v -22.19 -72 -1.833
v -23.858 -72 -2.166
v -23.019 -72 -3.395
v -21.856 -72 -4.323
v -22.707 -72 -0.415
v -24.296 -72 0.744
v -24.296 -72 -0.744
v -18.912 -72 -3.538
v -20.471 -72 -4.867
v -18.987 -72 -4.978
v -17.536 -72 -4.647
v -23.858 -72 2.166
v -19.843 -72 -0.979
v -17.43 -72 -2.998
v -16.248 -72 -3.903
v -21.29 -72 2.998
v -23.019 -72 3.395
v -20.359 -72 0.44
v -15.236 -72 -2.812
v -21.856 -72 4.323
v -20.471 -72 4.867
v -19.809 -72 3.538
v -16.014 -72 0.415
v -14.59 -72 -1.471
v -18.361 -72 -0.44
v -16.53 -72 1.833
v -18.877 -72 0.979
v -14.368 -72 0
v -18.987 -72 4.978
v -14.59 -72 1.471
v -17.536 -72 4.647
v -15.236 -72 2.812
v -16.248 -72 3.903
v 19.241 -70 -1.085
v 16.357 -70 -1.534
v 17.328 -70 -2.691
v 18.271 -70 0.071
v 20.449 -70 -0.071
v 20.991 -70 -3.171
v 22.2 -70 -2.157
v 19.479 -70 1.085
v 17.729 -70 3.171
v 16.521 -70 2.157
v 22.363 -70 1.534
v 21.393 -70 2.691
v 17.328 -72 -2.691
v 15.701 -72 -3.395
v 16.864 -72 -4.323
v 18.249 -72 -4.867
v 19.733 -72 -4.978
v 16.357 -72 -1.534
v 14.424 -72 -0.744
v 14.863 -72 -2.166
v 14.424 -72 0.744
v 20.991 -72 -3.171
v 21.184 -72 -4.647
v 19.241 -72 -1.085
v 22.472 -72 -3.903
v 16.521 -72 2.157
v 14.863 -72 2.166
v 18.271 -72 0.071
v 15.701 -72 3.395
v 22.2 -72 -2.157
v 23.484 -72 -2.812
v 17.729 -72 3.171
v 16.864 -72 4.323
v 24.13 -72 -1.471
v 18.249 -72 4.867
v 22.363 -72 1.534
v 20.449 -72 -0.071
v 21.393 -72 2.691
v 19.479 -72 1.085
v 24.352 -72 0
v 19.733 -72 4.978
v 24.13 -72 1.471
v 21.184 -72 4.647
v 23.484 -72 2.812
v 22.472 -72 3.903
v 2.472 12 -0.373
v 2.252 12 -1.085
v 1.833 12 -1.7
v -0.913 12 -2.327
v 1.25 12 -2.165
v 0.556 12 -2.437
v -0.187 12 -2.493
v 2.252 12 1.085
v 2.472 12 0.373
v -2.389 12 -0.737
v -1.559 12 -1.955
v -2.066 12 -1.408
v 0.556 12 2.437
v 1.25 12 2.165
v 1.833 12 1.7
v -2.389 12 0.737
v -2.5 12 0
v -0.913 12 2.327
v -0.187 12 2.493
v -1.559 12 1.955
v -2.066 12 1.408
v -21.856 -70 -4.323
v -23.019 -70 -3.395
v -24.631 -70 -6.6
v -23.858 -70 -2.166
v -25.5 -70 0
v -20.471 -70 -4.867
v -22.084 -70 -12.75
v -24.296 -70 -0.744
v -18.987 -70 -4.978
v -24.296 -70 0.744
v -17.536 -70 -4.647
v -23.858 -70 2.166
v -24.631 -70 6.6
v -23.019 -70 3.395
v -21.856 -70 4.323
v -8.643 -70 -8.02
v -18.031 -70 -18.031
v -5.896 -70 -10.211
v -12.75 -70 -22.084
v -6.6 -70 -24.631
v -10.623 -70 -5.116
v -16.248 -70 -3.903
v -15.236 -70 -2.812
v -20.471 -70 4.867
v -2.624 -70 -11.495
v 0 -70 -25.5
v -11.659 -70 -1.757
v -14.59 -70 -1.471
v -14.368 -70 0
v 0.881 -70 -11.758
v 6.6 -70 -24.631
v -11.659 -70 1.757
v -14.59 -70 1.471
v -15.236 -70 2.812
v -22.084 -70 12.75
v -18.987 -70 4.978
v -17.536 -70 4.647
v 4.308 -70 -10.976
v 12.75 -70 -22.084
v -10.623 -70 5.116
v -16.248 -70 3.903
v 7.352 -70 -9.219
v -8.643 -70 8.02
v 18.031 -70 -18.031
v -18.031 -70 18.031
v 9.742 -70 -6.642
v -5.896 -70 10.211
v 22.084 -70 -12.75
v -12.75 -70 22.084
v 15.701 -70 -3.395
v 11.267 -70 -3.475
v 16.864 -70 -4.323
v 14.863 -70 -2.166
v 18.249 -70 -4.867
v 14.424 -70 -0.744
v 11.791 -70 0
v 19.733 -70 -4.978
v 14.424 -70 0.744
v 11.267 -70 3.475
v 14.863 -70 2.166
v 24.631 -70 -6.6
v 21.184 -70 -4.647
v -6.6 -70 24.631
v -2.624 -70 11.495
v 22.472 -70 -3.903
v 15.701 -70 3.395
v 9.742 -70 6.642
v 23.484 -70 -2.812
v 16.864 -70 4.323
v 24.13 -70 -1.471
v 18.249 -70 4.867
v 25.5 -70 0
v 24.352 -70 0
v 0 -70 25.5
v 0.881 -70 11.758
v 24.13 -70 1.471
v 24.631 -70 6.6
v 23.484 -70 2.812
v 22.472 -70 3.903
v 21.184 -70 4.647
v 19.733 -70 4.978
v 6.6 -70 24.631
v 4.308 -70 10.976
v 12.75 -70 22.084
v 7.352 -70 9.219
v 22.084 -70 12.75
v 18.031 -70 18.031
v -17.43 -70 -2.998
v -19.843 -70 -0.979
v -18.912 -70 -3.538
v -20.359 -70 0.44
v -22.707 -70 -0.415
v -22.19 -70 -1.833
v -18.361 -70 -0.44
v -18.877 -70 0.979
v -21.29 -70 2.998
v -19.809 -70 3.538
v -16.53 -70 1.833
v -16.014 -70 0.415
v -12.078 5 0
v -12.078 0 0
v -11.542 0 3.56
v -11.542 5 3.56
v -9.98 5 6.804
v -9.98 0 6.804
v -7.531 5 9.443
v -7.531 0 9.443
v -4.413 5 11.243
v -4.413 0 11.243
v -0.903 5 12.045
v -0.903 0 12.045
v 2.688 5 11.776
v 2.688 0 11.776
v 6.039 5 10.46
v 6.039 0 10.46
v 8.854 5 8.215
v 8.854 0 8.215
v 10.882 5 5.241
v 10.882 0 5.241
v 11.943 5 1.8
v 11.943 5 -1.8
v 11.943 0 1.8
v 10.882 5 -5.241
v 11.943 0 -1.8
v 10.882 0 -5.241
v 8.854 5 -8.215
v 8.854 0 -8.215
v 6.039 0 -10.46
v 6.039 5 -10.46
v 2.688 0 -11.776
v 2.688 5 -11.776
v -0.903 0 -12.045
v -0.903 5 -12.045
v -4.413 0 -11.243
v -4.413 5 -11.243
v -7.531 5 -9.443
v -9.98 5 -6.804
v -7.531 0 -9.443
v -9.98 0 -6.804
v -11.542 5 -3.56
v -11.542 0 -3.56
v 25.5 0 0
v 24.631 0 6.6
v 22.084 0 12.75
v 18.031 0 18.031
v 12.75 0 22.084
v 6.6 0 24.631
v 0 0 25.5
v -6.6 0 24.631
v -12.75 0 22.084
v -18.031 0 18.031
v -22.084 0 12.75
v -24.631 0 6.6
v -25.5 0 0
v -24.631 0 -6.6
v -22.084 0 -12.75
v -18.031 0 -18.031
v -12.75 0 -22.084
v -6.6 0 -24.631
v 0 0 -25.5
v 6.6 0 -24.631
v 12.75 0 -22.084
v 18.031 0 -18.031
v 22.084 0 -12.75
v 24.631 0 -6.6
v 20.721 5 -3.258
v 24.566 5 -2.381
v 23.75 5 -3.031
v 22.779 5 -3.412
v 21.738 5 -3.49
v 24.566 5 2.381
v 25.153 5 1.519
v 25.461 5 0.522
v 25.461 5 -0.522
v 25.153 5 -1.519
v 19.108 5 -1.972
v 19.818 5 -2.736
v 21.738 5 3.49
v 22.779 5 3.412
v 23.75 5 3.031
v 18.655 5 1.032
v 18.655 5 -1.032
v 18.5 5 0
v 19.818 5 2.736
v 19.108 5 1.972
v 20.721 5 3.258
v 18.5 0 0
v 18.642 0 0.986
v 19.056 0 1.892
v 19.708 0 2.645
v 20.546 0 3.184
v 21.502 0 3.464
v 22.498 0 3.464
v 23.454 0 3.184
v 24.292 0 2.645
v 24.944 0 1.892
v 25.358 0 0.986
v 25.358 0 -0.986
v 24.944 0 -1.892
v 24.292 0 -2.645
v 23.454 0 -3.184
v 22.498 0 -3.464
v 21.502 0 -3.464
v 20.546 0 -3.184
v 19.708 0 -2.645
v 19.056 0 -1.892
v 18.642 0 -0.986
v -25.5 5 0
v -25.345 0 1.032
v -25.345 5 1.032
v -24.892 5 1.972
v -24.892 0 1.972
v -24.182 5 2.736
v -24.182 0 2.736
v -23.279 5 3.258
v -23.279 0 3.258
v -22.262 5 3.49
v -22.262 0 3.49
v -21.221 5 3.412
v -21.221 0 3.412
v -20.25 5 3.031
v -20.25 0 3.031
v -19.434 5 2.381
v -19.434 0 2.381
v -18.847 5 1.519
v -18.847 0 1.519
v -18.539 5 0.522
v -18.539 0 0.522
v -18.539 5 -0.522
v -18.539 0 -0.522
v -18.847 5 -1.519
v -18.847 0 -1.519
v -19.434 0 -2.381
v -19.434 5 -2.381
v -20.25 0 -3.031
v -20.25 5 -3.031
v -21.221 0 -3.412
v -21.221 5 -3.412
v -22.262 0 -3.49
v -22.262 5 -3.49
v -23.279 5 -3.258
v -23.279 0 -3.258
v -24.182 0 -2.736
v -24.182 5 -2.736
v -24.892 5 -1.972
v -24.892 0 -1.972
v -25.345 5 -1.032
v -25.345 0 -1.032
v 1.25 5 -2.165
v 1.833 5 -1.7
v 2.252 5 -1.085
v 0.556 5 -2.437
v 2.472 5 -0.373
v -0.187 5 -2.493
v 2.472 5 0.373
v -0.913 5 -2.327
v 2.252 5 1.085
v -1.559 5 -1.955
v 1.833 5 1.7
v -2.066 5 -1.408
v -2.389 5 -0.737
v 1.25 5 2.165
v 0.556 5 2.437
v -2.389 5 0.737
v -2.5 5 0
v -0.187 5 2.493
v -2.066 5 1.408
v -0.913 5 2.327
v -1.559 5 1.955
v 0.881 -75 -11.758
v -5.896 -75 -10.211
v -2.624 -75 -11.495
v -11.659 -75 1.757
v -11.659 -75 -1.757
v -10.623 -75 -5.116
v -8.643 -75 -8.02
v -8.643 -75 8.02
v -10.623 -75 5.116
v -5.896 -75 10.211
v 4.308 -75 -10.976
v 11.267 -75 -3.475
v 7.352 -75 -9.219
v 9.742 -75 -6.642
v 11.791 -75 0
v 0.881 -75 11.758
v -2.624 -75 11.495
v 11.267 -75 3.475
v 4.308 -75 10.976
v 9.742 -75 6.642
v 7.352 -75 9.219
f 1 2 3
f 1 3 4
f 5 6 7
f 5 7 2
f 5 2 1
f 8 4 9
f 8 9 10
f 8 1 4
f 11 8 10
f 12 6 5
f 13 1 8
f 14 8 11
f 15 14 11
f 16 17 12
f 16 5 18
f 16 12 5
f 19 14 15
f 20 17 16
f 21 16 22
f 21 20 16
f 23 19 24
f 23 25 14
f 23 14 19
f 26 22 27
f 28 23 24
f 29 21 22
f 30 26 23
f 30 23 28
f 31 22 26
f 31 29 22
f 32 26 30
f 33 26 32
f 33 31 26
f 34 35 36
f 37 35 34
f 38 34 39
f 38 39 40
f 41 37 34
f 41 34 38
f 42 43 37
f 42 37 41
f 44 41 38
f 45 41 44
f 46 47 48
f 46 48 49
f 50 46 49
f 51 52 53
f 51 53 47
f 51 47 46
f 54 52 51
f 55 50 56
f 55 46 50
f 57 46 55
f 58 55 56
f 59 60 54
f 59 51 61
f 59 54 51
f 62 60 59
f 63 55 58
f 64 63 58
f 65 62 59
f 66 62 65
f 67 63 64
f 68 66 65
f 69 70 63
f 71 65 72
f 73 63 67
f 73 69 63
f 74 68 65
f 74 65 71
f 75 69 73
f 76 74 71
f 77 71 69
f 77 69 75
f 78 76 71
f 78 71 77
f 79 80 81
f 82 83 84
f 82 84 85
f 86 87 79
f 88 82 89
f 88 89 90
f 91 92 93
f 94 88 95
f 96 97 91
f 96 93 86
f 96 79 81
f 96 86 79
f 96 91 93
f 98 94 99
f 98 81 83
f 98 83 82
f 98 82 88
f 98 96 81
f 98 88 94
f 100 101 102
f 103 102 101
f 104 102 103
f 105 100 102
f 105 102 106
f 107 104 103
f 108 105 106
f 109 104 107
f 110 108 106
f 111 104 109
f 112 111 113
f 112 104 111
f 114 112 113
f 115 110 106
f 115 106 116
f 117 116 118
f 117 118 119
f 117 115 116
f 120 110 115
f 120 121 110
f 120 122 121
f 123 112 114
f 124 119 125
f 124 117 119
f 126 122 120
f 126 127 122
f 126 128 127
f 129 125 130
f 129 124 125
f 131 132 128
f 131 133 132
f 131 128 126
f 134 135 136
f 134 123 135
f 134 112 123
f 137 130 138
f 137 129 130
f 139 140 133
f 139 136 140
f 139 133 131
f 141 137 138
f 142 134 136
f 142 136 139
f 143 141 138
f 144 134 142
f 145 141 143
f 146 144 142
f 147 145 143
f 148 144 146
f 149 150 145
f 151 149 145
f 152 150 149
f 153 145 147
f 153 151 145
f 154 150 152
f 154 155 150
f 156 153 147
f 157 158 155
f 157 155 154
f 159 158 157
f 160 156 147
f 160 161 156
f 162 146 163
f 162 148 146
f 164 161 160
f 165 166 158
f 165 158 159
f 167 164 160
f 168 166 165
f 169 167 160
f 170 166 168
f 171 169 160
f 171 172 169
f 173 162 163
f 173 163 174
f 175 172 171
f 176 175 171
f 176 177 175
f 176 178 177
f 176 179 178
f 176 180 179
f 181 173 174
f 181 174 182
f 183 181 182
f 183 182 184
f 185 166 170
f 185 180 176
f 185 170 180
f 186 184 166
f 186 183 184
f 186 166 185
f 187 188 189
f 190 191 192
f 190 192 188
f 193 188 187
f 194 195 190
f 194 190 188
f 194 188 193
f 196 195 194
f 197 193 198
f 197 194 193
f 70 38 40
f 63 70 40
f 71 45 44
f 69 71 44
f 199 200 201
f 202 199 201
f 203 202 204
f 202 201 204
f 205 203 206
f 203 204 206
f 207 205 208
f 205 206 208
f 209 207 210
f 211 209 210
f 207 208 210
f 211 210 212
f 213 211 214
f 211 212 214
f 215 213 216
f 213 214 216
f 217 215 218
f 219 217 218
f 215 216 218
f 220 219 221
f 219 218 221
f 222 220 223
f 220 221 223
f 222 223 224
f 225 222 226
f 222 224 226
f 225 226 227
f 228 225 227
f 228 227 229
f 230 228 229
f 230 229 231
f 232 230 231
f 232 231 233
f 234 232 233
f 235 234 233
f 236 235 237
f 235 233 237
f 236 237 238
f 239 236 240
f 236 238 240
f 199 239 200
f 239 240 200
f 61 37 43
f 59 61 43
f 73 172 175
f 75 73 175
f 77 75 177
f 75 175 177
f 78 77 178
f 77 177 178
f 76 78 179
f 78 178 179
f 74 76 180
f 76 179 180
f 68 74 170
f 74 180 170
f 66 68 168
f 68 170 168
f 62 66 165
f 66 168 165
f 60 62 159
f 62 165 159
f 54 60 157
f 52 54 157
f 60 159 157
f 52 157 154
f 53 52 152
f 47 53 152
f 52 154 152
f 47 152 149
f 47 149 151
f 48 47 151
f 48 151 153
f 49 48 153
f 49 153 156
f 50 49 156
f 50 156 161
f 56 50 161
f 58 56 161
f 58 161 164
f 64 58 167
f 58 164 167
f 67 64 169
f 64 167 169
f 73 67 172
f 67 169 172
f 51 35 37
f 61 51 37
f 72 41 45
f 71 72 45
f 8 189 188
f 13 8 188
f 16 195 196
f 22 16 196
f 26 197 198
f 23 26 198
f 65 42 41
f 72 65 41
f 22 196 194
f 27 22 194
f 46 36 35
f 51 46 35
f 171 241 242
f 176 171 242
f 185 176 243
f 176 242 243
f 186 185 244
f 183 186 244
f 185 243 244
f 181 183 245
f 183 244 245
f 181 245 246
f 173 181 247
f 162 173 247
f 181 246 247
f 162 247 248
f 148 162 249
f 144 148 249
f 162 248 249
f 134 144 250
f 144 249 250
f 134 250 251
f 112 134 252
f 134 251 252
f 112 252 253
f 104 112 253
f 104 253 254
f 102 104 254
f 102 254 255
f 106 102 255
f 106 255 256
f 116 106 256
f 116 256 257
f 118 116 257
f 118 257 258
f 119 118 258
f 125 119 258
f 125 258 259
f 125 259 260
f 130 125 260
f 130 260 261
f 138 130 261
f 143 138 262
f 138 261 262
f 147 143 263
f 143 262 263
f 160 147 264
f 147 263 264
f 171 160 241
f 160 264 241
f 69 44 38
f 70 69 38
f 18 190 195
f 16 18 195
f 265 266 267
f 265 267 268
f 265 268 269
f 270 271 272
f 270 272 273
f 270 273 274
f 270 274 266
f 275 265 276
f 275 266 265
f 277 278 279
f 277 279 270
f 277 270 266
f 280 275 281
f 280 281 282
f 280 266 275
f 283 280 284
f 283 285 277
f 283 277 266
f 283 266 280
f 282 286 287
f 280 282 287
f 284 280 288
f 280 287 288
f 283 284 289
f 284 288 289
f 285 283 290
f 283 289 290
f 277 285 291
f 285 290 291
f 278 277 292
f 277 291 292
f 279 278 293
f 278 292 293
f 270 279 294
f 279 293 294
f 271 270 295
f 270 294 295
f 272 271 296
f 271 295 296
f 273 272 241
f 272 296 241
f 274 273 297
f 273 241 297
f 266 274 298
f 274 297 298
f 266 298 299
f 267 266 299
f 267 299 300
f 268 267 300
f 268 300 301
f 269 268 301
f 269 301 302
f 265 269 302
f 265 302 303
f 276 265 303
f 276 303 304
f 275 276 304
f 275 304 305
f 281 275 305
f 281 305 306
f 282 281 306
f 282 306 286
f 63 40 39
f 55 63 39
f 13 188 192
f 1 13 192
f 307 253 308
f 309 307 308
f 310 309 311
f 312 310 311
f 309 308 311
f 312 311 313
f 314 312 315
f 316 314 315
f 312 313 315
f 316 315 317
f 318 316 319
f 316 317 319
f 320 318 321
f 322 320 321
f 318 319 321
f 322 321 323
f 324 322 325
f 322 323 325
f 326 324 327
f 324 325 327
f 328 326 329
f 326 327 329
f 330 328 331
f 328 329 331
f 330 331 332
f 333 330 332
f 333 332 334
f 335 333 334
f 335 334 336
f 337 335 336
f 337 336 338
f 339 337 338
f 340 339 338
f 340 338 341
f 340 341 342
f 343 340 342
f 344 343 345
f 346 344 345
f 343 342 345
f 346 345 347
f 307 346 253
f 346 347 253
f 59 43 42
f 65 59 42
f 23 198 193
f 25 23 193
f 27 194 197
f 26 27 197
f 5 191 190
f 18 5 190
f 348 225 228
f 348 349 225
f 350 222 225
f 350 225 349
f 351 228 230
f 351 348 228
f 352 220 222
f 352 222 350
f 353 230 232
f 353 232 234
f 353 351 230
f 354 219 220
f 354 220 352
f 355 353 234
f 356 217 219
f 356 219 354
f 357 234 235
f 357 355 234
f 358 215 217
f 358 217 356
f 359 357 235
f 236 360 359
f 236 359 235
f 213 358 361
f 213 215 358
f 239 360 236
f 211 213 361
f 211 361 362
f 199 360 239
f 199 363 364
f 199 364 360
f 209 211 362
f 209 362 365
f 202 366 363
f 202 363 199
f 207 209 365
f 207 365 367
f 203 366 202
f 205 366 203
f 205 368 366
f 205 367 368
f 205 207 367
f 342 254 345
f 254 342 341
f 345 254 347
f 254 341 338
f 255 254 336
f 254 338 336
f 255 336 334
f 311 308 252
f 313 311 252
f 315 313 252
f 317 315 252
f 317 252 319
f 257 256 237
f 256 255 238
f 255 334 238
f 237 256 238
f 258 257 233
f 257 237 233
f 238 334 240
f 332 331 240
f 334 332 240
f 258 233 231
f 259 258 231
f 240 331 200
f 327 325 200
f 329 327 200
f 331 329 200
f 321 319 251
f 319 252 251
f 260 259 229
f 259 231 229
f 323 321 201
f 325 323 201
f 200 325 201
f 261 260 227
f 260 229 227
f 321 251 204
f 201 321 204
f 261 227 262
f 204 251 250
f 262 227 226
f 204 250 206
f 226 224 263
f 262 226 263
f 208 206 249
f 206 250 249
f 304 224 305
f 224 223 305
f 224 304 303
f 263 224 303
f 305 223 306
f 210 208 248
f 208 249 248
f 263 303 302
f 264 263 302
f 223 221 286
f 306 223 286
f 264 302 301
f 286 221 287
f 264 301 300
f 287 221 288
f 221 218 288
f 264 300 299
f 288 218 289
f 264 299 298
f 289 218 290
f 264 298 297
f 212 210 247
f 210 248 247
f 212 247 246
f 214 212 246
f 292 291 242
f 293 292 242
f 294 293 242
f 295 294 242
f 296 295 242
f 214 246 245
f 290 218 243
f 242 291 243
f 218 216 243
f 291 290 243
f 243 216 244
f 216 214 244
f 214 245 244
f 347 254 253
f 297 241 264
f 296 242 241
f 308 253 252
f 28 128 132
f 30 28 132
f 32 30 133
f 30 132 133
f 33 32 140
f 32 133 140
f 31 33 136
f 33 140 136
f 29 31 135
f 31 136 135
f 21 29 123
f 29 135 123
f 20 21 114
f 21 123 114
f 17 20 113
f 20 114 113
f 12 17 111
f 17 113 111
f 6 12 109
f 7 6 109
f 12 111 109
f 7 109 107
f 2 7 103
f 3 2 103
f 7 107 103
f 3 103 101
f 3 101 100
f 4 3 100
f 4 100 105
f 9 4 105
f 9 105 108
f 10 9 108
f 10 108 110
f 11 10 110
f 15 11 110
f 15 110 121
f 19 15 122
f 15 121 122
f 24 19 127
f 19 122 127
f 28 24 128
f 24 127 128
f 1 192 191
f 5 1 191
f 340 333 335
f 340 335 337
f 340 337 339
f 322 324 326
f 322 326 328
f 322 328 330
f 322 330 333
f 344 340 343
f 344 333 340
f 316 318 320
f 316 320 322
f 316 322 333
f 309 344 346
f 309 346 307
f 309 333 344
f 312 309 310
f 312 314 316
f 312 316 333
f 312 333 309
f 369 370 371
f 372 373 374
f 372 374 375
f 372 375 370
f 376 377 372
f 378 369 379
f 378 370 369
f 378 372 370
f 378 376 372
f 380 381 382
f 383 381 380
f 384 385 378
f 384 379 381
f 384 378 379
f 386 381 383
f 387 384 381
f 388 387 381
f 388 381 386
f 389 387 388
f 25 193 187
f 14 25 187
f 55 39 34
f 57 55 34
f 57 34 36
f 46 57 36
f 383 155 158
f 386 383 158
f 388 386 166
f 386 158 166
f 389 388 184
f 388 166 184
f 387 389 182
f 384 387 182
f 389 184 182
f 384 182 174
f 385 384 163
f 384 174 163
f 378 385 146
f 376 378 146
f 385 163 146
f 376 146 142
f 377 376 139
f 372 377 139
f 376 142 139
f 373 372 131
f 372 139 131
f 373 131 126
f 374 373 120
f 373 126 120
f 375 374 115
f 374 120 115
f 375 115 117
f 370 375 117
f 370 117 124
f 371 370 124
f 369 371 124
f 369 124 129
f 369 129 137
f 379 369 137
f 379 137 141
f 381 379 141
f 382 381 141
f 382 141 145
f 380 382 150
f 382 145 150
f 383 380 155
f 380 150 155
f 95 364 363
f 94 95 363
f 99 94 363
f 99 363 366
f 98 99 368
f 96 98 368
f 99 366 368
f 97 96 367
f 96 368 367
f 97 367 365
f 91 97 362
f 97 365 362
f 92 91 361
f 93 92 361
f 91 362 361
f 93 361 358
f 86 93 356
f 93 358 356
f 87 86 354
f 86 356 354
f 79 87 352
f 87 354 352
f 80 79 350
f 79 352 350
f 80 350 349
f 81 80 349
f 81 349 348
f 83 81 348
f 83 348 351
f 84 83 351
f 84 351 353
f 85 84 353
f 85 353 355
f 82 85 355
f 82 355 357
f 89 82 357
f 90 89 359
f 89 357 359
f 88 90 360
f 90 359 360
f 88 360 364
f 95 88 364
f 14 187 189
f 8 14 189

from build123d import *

# Parameters (mm, degrees)
F0_R     = 25.5
F1_DEPTH = 70
F2_R     = 11.791029
F3_DEPTH = 5
F4_R     = 12.078347
F4_R_2   = 3.5
F5_DEPTH = 5
F6_R     = 2.5
F7_DEPTH = 7
F8_R     = 4.991822
F9_DEPTH = 2


with BuildPart() as f1:
    # F0 (on Front) → F1 (new body)
    with BuildSketch(Plane.XZ):
        Circle(F0_R)
    extrude(amount=F1_DEPTH)

    # F2 (on face) → F3 (join)
    with BuildSketch(Plane.XZ.offset(70)):
        Circle(F2_R)
    extrude(amount=F3_DEPTH)

    # F4 (on face) → F5 (join)
    with BuildSketch(Plane(origin=(0, 0, 0), x_dir=(-1, 0, 0), z_dir=(0, 1, 0))):
        Circle(F4_R)
        with Locations((-22, 0)):
            Circle(F4_R_2)
        with Locations((22, 0)):
            Circle(F4_R_2)
    extrude(amount=F5_DEPTH)

    # F6 (on face) → F7 (join)
    with BuildSketch(Plane(origin=(0, 5, 0), x_dir=(-1, 0, 0), z_dir=(0, 1, 0))):
        Circle(F6_R)
    extrude(amount=F7_DEPTH)

    # F8 (on face) → F9 (join)
    with BuildSketch(Plane.XZ.offset(70)):
        with Locations((-19.360058, 0)):
            Circle(F8_R)
        Polygon((-20.359145, 0.43953), (-21.290478, 2.998349), (-19.808572, 3.537719), (-18.877238, 0.9789), (-16.529848, 1.83328), (-16.013582, 0.41485), (-18.360971, -0.43953), (-17.429638, -2.998349), (-18.911544, -3.537719), (-19.842878, -0.9789), (-22.190268, -1.83328), (-22.706534, -0.41485), align=None, mode=Mode.SUBTRACT)
        with Locations((19.360058, 0)):
            Circle(F8_R)
        Polygon((19.241159, -1.085), (17.327549, -2.690709), (16.357286, -1.534394), (18.270895, 0.071316), (16.52056, 2.157284), (17.728622, 3.170968), (19.478957, 1.085), (21.392567, 2.690709), (22.36283, 1.534394), (20.449221, -0.071316), (22.199556, -2.157284), (20.991494, -3.170968), align=None, mode=Mode.SUBTRACT)
    extrude(amount=F9_DEPTH)


solid = f1.part
